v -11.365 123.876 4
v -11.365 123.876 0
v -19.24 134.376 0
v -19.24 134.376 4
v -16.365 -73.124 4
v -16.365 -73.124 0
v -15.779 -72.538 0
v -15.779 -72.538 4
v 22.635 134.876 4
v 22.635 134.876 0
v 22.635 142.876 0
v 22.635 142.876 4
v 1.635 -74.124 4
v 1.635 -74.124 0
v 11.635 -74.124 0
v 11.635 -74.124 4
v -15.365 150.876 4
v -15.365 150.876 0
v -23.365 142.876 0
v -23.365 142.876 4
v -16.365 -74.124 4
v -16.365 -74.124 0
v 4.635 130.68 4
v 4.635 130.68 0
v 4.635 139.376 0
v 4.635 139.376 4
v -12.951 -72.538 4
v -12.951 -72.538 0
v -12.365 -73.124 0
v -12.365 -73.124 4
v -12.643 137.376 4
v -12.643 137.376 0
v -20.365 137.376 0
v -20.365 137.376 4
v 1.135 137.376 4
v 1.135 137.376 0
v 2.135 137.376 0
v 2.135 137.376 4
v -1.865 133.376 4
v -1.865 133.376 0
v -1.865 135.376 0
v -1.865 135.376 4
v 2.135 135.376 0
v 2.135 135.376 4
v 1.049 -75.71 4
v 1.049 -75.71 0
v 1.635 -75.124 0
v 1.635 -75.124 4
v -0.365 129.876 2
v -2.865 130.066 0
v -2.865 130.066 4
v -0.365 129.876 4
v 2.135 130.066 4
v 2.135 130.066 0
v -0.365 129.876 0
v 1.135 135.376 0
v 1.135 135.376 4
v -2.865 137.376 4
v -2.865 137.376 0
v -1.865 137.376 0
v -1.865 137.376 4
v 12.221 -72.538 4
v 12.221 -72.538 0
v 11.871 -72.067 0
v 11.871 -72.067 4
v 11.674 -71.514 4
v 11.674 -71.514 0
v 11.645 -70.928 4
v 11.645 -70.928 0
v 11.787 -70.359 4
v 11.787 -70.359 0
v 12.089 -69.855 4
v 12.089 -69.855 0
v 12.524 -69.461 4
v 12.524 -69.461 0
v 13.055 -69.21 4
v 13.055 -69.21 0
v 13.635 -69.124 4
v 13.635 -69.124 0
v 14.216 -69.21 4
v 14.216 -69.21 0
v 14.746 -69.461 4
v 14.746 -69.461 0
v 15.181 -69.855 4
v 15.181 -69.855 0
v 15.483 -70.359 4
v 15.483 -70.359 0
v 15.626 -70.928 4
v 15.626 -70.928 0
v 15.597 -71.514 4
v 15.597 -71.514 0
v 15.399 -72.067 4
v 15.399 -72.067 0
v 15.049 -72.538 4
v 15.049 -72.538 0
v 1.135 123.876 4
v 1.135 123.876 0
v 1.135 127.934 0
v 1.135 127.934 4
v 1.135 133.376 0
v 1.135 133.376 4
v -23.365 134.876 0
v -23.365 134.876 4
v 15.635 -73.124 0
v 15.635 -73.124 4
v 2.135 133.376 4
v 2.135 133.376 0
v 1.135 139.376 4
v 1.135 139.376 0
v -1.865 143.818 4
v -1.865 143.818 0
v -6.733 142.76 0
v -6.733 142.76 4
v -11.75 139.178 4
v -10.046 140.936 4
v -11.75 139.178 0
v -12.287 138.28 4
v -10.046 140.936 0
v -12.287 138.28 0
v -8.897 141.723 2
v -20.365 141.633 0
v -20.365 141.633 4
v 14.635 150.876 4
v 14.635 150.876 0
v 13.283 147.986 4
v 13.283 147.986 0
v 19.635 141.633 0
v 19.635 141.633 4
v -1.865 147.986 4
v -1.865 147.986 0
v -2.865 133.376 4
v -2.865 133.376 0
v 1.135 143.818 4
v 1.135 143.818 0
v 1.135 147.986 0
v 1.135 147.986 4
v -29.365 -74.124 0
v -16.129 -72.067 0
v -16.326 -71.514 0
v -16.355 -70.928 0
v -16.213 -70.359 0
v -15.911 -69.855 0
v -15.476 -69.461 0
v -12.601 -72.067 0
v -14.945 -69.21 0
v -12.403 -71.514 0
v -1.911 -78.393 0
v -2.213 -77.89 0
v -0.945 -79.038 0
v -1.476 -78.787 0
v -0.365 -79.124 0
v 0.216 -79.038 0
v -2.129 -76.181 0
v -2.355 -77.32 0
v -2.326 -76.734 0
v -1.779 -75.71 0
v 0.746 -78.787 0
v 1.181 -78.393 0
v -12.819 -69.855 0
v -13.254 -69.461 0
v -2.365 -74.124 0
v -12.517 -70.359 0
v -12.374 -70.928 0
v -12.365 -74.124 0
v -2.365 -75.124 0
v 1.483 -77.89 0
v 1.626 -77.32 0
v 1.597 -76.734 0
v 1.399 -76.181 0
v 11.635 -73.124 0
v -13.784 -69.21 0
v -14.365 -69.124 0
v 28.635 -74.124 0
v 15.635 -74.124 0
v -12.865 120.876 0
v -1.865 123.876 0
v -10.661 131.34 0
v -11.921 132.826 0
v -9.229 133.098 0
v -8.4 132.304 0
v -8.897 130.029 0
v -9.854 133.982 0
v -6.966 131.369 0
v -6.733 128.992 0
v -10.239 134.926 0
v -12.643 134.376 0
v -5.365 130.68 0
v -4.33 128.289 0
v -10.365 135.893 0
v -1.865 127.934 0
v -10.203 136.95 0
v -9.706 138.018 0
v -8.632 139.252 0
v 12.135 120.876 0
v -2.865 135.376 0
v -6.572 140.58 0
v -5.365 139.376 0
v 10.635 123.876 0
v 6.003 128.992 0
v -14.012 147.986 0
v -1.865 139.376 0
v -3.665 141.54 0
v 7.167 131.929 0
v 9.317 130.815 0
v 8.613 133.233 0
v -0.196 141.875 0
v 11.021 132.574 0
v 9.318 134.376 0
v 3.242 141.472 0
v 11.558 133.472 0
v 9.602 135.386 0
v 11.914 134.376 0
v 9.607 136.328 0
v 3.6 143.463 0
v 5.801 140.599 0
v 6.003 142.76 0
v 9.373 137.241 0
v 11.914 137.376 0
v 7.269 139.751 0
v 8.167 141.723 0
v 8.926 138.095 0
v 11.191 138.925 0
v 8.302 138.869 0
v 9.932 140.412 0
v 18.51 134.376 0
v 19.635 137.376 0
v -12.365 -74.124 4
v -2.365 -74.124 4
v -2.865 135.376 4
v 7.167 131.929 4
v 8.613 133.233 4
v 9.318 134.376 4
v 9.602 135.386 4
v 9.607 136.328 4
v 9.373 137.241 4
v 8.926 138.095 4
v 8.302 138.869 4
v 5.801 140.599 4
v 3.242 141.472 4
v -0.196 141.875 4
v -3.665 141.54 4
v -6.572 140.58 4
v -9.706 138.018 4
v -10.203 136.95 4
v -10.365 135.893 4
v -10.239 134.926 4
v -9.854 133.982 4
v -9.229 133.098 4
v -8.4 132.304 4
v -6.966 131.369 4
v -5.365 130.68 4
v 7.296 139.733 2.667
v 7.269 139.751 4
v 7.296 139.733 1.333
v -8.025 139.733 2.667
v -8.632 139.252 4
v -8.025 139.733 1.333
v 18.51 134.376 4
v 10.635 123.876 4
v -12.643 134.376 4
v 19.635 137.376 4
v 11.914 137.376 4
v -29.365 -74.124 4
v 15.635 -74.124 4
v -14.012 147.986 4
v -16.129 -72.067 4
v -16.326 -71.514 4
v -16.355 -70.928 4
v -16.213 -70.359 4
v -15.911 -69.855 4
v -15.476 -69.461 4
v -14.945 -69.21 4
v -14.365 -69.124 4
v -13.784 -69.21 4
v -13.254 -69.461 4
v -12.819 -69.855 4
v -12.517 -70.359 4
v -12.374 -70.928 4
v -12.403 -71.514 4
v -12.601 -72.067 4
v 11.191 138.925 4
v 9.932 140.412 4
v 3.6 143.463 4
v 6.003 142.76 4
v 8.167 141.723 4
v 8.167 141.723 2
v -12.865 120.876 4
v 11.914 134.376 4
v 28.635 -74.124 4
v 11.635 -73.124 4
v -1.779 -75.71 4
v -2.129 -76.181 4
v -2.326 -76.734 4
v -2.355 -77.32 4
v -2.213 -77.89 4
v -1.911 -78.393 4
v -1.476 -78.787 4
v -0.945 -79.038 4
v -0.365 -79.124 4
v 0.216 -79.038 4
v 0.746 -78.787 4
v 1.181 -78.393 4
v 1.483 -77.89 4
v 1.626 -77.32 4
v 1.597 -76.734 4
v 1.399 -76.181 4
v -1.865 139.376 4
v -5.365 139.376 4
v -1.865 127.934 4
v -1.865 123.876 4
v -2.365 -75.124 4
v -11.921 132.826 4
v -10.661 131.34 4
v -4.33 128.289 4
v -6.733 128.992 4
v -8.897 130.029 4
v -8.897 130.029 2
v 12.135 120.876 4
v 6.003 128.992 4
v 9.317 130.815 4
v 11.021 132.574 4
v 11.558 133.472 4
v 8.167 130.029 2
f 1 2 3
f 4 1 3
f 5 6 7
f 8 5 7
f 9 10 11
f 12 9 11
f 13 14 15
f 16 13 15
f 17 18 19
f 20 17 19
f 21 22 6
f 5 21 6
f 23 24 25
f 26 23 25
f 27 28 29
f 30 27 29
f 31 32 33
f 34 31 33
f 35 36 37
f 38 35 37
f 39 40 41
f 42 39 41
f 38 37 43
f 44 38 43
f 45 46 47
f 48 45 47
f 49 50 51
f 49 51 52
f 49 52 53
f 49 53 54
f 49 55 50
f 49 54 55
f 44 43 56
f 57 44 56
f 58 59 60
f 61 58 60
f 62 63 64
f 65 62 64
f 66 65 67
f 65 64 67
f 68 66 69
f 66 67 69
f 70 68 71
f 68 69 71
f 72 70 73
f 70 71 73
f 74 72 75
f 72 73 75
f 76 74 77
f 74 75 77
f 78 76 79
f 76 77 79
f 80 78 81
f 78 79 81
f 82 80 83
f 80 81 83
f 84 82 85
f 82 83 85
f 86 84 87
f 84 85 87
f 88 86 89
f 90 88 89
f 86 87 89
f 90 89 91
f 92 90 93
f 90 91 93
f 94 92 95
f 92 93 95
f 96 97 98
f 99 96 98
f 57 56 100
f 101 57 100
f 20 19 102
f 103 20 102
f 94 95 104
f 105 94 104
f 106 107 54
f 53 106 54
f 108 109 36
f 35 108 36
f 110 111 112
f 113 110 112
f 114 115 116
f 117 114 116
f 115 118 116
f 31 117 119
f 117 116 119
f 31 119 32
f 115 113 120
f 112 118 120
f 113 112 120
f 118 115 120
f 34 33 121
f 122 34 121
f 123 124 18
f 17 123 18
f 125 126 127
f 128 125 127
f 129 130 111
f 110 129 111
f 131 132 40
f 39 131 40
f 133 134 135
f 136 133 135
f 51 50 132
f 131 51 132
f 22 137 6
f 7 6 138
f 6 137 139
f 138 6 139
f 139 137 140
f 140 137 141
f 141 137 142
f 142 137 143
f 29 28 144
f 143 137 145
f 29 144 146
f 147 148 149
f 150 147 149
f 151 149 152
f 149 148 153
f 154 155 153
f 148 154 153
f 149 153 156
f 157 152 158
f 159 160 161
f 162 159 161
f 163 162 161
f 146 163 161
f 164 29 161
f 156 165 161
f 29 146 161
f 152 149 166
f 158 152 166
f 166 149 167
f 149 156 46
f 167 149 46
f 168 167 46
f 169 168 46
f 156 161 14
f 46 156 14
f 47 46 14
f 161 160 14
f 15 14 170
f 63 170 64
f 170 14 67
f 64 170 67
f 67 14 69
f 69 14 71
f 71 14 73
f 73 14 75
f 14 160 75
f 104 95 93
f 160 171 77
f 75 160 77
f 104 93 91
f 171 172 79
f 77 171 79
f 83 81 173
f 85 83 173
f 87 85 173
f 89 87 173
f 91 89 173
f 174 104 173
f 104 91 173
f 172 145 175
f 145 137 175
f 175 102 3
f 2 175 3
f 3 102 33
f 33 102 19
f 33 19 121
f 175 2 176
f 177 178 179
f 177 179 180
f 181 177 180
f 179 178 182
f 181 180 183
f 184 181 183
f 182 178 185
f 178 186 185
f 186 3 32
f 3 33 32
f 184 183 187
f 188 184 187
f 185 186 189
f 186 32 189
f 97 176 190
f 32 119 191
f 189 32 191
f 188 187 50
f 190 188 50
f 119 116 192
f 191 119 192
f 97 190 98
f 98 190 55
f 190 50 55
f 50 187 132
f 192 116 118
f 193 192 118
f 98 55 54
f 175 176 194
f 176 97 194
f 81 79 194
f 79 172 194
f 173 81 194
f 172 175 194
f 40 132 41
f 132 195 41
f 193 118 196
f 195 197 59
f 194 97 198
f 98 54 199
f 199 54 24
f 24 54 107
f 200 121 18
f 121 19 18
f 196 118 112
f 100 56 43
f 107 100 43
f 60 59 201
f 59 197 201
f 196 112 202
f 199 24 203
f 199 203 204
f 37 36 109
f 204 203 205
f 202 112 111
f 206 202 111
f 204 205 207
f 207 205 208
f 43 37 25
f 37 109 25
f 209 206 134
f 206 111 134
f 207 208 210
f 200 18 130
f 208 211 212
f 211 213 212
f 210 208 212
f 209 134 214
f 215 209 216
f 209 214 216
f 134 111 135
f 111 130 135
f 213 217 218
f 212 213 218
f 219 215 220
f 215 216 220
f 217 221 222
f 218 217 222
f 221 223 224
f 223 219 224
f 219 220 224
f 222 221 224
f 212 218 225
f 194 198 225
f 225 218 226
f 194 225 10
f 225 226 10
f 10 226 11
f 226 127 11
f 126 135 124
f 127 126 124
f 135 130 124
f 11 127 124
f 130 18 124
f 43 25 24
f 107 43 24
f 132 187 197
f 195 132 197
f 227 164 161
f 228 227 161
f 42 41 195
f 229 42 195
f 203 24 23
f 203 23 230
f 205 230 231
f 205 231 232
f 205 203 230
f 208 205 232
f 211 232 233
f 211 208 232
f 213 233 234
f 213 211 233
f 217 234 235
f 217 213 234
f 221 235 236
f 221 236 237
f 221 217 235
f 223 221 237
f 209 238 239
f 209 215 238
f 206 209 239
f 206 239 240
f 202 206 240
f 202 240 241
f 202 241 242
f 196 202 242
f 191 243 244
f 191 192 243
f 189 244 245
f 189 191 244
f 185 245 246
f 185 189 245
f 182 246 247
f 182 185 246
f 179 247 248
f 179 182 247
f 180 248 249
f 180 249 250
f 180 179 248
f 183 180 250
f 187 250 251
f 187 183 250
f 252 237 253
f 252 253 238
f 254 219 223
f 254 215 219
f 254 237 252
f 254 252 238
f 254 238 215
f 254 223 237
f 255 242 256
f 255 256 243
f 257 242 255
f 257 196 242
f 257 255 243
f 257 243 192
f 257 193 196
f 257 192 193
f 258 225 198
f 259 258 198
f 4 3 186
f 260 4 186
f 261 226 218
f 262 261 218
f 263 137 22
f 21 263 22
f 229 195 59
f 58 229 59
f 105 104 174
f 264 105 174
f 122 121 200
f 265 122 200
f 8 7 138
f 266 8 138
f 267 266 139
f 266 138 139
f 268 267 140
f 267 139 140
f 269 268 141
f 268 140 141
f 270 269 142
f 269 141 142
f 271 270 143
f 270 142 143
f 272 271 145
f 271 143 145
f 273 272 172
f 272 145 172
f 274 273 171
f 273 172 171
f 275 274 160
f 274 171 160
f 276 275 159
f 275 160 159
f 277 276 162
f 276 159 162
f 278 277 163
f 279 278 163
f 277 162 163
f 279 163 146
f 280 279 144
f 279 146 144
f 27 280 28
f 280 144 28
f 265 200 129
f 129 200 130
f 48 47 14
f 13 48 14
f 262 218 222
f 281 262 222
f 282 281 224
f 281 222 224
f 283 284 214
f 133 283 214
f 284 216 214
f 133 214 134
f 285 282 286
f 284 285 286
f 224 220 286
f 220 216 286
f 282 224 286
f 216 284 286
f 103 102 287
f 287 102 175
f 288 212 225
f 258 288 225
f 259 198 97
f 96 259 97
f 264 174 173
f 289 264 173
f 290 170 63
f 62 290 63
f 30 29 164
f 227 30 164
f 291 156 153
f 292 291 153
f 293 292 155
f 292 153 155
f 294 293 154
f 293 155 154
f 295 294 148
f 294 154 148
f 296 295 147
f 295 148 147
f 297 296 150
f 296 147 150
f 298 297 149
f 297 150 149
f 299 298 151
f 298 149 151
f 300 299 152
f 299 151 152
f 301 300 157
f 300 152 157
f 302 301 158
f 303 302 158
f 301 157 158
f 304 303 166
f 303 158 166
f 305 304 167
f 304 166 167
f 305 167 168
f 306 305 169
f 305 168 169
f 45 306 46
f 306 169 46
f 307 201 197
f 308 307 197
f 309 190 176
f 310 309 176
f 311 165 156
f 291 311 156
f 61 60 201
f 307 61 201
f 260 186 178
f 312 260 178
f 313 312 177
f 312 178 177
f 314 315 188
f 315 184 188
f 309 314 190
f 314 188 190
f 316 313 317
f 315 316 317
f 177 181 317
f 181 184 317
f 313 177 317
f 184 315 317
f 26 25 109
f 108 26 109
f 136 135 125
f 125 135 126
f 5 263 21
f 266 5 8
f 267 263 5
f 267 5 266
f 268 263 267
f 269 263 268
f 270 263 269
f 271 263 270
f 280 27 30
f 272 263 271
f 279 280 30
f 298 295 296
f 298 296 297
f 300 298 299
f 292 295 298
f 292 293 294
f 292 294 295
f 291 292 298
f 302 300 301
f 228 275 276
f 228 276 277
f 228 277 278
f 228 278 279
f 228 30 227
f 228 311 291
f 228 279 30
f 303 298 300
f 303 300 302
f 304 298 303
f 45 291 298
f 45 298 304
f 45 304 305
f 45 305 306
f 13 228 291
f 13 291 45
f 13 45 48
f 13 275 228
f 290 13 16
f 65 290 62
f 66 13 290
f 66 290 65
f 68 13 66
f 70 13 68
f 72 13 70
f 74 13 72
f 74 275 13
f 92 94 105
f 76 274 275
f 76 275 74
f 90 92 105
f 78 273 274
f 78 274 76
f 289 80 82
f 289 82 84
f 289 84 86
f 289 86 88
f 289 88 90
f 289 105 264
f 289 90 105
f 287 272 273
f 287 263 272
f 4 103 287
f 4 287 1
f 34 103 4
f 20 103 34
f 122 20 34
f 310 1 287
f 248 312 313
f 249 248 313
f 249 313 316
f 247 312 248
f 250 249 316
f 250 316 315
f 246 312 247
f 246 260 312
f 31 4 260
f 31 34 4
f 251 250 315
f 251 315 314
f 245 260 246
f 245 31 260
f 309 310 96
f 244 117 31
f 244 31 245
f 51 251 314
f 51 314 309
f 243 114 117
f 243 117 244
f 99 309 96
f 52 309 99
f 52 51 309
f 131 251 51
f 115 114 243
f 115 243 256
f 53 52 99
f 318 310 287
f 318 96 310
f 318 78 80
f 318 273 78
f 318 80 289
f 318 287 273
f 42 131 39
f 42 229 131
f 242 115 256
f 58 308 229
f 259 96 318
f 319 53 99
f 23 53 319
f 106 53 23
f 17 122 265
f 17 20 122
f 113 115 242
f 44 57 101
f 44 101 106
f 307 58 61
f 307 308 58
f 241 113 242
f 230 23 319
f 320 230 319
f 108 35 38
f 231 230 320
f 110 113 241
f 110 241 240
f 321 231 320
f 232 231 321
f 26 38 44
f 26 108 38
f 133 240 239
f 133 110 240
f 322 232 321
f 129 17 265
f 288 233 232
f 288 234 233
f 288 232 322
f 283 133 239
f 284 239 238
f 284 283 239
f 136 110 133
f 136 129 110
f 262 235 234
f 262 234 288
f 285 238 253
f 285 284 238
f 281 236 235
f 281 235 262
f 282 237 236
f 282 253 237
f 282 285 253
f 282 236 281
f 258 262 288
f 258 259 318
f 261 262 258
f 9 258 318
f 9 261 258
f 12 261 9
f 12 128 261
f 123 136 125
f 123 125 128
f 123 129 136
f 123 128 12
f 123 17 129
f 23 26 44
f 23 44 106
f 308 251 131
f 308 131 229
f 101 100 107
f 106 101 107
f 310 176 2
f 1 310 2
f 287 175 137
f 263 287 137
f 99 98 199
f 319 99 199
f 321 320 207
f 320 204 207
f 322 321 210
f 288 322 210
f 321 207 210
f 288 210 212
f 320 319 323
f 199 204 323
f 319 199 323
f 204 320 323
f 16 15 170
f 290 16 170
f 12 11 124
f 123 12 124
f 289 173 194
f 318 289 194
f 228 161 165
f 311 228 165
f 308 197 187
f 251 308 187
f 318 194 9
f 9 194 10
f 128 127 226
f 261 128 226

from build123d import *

# Parameters (mm, degrees)
F1_DEPTH = 4


with BuildPart() as f1:
    # F0 (on Top) → F1 (new body)
    with BuildSketch(Plane.XY):
        Polygon((22.6351957535, 142.8757803243), (14.6351957535, 150.8757803243), (-15.3648042465, 150.8757803243), (-23.3648042465, 142.8757803243), (-23.3648042465, 134.8757803243), (-12.8648042465, 120.8757803243), (12.1351957535, 120.8757803243), (22.6351957535, 134.8757803243), align=None)
        with BuildLine():
            Line((-1.8648042465, 123.8757803243), (-11.3648042465, 123.8757803243))
            Line((-11.3648042465, 123.8757803243), (-19.2398042465, 134.3757803243))
            Line((-19.2398042465, 134.3757803243), (-12.643111782, 134.3757803243))
            add(Edge.make_bspline(
                [(-12.643111782, 134.3757803243), (-10.9308544177, 128.6349298073), (-1.8648042465, 127.9335891908)],
                knots=[3.3302090398, 3.3302090398, 3.3302090398, 4.592099098, 4.592099098, 4.592099098], degree=2, weights=[1, 0.8074703886, 1]))
            Line((-1.8648042465, 127.9335891908), (-1.8648042465, 123.8757803243))
        make_face(mode=Mode.SUBTRACT)
        with BuildLine():
            Line((-20.3648042465, 137.3757803243), (-20.3648042465, 141.6331396372))
            Line((-20.3648042465, 141.6331396372), (-14.0124294414, 147.9855144423))
            Line((-14.0124294414, 147.9855144423), (-1.8648042465, 147.9855144423))
            Line((-1.8648042465, 147.9855144423), (-1.8648042465, 143.8179714577))
            add(Edge.make_bspline(
                [(-1.8648042465, 143.8179714577), (-10.9308544177, 143.1166308413), (-12.643111782, 137.3757803243)],
                knots=[1.6910862092, 1.6910862092, 1.6910862092, 2.9529762674, 2.9529762674, 2.9529762674], degree=2, weights=[1, 0.8074703886, 1]))
            Line((-12.643111782, 137.3757803243), (-20.3648042465, 137.3757803243))
        make_face(mode=Mode.SUBTRACT)
        with BuildLine():
            add(Edge.make_bspline(
                [(4.6351957535, 130.6796279016), (14.9560846159, 134.2548886794), (7.2956401847, 139.7325059824), (-0.3648042465, 145.2101232854), (-8.0252486777, 139.7325059824), (-15.6856931088, 134.2548886794), (-5.3648042465, 130.6796279016)],
                knots=[5.235987756, 5.235987756, 5.235987756, 6.981317008, 6.981317008, 8.72664626, 8.72664626, 10.471975512, 10.471975512, 10.471975512], degree=2, weights=[1, 0.6427876097, 1, 0.6427876097, 1, 0.6427876097, 1]))
            Line((4.6351957535, 130.6796279016), (4.6351957535, 137.3757803243))
            Line((4.6351957535, 137.3757803243), (4.6351957535, 139.3757803243))
            Line((4.6351957535, 139.3757803243), (1.1351957535, 139.3757803243))
            Line((1.1351957535, 139.3757803243), (1.1351957535, 137.3757803243))
            Line((1.1351957535, 137.3757803243), (2.1351957535, 137.3757803243))
            Line((2.1351957535, 137.3757803243), (2.1351957535, 135.3757803243))
            Line((2.1351957535, 135.3757803243), (1.1351957535, 135.3757803243))
            Line((1.1351957535, 135.3757803243), (1.1351957535, 133.3757803243))
            Line((1.1351957535, 133.3757803243), (2.1351957535, 133.3757803243))
            Line((2.1351957535, 133.3757803243), (2.1351957535, 130.066305305))
            add(Edge.make_bspline(
                [(-2.8648042465, 130.066305305), (-0.3648042465, 129.6790069704), (2.1351957535, 130.066305305)],
                knots=[4.4597087252, 4.4597087252, 4.4597087252, 4.9650692355, 4.9650692355, 4.9650692355], degree=2, weights=[1, 0.9682458366, 1]))
            Line((-2.8648042465, 130.066305305), (-2.8648042465, 133.3757803243))
            Line((-2.8648042465, 133.3757803243), (-1.8648042465, 133.3757803243))
            Line((-1.8648042465, 133.3757803243), (-1.8648042465, 135.3757803243))
            Line((-1.8648042465, 135.3757803243), (-2.8648042465, 135.3757803243))
            Line((-2.8648042465, 135.3757803243), (-2.8648042465, 137.3757803243))
            Line((-2.8648042465, 137.3757803243), (-1.8648042465, 137.3757803243))
            Line((-1.8648042465, 137.3757803243), (-1.8648042465, 139.3757803243))
            Line((-1.8648042465, 139.3757803243), (-5.3648042465, 139.3757803243))
            Line((-5.3648042465, 139.3757803243), (-5.3648042465, 137.3757803243))
            Line((-5.3648042465, 137.3757803243), (-5.3648042465, 130.6796279016))
        make_face(mode=Mode.SUBTRACT)
        with BuildLine():
            Line((1.1351957535, 123.8757803243), (1.1351957535, 127.9335891908))
            add(Edge.make_bspline(
                [(1.1351957535, 127.9335891908), (10.2012459248, 128.6349298073), (11.9135032891, 134.3757803243)],
                knots=[4.8326788628, 4.8326788628, 4.8326788628, 6.094568921, 6.094568921, 6.094568921], degree=2, weights=[1, 0.8074703886, 1]))
            Line((11.9135032891, 134.3757803243), (18.5101957535, 134.3757803243))
            Line((18.5101957535, 134.3757803243), (10.6351957535, 123.8757803243))
            Line((10.6351957535, 123.8757803243), (1.1351957535, 123.8757803243))
        make_face(mode=Mode.SUBTRACT)
        with BuildLine():
            Line((1.1351957535, 147.9855144423), (13.2828209484, 147.9855144423))
            Line((13.2828209484, 147.9855144423), (19.6351957535, 141.6331396372))
            Line((19.6351957535, 141.6331396372), (19.6351957535, 137.3757803243))
            Line((19.6351957535, 137.3757803243), (11.9135032891, 137.3757803243))
            add(Edge.make_bspline(
                [(11.9135032891, 137.3757803243), (10.2012459248, 143.1166308413), (1.1351957535, 143.8179714577)],
                knots=[0.1886163862, 0.1886163862, 0.1886163862, 1.4505064444, 1.4505064444, 1.4505064444], degree=2, weights=[1, 0.8074703886, 1]))
            Line((1.1351957535, 143.8179714577), (1.1351957535, 147.9855144423))
        make_face(mode=Mode.SUBTRACT)
        with BuildLine():
            Line((28.6351957535, -74.1242196757), (12.1351957535, 120.8757803243))
            Line((12.1351957535, 120.8757803243), (-12.8648042465, 120.8757803243))
            Line((-12.8648042465, 120.8757803243), (-29.3648042465, -74.1242196757))
            Line((-29.3648042465, -74.1242196757), (-16.3648042465, -74.1242196757))
            Line((-16.3648042465, -74.1242196757), (-16.3648042465, -73.1242196757))
            Line((-16.3648042465, -73.1242196757), (-15.7790178088, -72.5384332381))
            ThreePointArc((-15.7790178088, -72.5384332381), (-14.3648042465, -69.1242196757), (-12.9505906841, -72.5384332381))
            Line((-12.9505906841, -72.5384332381), (-12.3648042465, -73.1242196757))
            Line((-12.3648042465, -73.1242196757), (-12.3648042465, -74.1242196757))
            Line((-12.3648042465, -74.1242196757), (-2.3648042465, -74.1242196757))
            Line((-2.3648042465, -74.1242196757), (-2.3648042465, -75.1242196757))
            Line((-2.3648042465, -75.1242196757), (-1.7790178088, -75.7100061133))
            ThreePointArc((-1.7790178088, -75.7100061133), (-0.3648042465, -79.1242196757), (1.0494093159, -75.7100061133))
            Line((1.0494093159, -75.7100061133), (1.6351957535, -75.1242196757))
            Line((1.6351957535, -75.1242196757), (1.6351957535, -74.1242196757))
            Line((1.6351957535, -74.1242196757), (11.6351957535, -74.1242196757))
            Line((11.6351957535, -74.1242196757), (11.6351957535, -73.1242196757))
            Line((11.6351957535, -73.1242196757), (12.2209821912, -72.5384332381))
            ThreePointArc((12.2209821912, -72.5384332381), (13.6351957535, -69.1242196757), (15.0494093159, -72.5384332381))
            Line((15.0494093159, -72.5384332381), (15.6351957535, -73.1242196757))
            Line((15.6351957535, -73.1242196757), (15.6351957535, -74.1242196757))
            Line((15.6351957535, -74.1242196757), (28.6351957535, -74.1242196757))
        make_face()
    extrude(amount=F1_DEPTH)


solid = f1.part
